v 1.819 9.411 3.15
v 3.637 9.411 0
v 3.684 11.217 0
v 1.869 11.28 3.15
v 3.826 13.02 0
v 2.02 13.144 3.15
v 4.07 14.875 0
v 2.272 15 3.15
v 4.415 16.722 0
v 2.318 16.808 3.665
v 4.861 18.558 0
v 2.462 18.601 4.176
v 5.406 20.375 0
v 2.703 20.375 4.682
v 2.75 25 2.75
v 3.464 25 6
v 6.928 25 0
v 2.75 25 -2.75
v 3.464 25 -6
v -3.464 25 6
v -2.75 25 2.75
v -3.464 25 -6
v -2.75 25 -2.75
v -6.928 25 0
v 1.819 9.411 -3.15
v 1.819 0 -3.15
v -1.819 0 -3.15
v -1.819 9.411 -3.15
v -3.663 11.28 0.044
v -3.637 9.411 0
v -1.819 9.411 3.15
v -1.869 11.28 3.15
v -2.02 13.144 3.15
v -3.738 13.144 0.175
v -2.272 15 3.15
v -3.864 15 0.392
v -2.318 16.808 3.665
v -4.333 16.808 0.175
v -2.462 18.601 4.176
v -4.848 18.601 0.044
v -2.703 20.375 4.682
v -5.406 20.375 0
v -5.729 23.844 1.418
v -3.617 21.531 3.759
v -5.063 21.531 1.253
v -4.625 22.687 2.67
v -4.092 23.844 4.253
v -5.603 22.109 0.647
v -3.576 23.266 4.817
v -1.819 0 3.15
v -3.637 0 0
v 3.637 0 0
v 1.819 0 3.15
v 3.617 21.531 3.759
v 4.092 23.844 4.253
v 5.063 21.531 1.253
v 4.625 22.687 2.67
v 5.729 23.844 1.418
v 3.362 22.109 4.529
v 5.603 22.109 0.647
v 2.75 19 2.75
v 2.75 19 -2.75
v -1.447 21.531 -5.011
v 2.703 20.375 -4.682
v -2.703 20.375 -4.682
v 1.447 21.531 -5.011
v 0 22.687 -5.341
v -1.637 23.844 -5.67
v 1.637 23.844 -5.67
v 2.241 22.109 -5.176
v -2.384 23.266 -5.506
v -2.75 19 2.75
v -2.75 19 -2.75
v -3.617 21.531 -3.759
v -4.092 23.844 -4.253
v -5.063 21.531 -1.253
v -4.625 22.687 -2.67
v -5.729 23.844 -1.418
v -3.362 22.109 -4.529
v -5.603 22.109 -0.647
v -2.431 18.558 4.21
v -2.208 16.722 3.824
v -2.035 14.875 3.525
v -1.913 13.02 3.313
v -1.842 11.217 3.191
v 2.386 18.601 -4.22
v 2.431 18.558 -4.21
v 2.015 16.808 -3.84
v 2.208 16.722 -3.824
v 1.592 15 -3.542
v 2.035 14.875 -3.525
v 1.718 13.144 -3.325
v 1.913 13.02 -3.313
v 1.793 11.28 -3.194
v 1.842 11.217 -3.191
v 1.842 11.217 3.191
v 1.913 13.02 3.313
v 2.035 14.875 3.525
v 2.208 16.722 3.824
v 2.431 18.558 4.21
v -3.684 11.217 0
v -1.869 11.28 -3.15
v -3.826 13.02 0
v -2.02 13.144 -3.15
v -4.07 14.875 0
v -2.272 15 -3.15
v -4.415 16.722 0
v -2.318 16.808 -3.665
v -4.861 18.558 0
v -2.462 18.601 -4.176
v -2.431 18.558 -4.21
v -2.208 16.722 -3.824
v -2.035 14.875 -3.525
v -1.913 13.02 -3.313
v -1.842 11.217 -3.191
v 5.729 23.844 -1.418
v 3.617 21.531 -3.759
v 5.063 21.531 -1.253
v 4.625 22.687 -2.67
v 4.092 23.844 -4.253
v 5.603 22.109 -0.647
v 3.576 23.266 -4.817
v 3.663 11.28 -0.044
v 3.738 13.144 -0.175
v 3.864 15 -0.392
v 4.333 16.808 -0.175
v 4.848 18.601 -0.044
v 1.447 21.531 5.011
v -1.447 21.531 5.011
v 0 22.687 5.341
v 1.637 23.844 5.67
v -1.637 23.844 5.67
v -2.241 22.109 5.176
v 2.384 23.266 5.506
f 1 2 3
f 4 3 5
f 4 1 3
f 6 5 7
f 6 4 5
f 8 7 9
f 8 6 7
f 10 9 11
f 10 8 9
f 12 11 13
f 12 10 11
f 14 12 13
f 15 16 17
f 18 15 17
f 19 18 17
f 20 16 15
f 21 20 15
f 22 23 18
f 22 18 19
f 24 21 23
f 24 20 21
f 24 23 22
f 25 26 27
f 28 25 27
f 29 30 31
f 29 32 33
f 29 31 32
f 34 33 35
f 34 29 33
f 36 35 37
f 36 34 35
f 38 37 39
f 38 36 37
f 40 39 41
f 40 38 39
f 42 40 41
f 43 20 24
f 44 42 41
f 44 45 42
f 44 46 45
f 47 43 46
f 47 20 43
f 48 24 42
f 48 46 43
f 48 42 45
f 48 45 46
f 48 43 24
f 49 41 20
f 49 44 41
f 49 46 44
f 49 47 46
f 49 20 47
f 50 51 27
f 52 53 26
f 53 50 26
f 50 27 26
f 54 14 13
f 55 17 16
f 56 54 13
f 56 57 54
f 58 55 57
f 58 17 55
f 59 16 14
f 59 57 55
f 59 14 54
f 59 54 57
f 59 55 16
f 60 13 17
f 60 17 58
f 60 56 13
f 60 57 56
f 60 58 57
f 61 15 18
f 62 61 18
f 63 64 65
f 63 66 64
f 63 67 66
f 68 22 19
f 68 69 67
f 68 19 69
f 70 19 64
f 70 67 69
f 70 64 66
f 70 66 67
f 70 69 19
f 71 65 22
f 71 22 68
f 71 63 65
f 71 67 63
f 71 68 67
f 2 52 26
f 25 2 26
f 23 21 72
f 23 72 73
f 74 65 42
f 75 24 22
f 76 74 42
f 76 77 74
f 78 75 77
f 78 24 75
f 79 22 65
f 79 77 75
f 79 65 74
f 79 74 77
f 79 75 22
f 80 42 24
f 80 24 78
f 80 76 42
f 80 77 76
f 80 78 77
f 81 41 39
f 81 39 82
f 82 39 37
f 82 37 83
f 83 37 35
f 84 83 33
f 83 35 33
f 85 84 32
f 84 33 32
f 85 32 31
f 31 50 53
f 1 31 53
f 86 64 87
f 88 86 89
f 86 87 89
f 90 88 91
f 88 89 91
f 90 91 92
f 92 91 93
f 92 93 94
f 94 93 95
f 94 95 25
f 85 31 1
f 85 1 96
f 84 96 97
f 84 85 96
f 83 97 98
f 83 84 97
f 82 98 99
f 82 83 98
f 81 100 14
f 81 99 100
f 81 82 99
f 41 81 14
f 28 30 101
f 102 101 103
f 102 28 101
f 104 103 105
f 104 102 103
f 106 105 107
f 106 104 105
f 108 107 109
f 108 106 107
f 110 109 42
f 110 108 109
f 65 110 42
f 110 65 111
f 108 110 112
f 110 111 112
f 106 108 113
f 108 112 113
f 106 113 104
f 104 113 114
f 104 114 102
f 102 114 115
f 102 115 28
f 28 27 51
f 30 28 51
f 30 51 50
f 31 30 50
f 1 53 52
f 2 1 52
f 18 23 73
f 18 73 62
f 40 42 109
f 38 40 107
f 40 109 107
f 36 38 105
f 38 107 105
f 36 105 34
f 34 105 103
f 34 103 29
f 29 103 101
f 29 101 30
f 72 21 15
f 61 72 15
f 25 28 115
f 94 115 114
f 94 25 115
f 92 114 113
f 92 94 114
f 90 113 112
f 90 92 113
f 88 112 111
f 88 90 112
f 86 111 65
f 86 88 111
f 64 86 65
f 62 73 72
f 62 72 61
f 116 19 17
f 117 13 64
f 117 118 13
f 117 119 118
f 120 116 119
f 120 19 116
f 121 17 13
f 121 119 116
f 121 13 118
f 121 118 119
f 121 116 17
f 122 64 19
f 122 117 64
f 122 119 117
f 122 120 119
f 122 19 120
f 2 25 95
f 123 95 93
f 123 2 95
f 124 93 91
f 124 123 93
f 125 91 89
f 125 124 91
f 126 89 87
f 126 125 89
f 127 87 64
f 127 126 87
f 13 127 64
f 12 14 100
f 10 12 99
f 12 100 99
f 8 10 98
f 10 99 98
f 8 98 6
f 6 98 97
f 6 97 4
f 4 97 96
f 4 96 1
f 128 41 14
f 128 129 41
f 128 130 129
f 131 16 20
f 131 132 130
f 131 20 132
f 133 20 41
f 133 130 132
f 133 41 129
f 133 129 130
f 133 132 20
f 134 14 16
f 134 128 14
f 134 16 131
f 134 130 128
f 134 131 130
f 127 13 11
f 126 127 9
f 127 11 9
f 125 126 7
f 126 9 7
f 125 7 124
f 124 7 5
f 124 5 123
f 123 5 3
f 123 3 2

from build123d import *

# Parameters (mm, degrees)
BOSS_EXTRU_1_DEPTH      = 15
ESQUISSE4_W             = 5.5
ESQUISSE4_H             = 5.5
ENL_V_MAT_EXTRU_1_DEPTH = 6
CONG_2_R                = 40


with BuildPart() as part:
    # Esquisse1 → Boss.-Extru.1 (new body)
    with BuildSketch(Plane(origin=(0, 0, 0), x_dir=(1, 0, 0), z_dir=(0, 1, 0))):
        Polygon((1.818653348, -3.15), (3.637306696, 0), (1.818653348, 3.15), (-1.818653348, 3.15), (-3.637306696, 0), (-1.818653348, -3.15), align=None)
    extrude(amount=BOSS_EXTRU_1_DEPTH)

    # Esquisse3 → section 1 of lissage1
    with BuildSketch(Plane(origin=(0, 25, 0), x_dir=(1, 0, 0), z_dir=(0, 1, 0)), mode=Mode.PRIVATE) as lissage1_s1:
        with BuildLine():
            Line((3.464101615, -6), (6.92820323, 0))
            Line((6.92820323, 0), (3.464101615, 6))
            Line((3.464101615, 6), (-3.464101615, 6))
            Line((-3.464101615, 6), (-6.92820323, 0))
            Line((-6.92820323, 0), (-3.464101615, -6))
            Line((-3.464101615, -6), (3.464101615, -6))
        make_face()
    # loft from a face of the part (lissage1)
    loft([part.faces().sort_by_distance((0, 15, 0))[0], lissage1_s1.sketch])

    # Esquisse4 → Enlèv. mat.-Extru.1 (cut)
    with BuildSketch(Plane(origin=(0, 25, 0), x_dir=(1, 0, 0), z_dir=(0, 1, 0))):
        Rectangle(ESQUISSE4_W, ESQUISSE4_H)
    extrude(amount=-ENL_V_MAT_EXTRU_1_DEPTH, mode=Mode.SUBTRACT)

    # Congé2
    # the kernel refuses this fillet: 40 mm, written as the material it adds along each edge
    with BuildSketch(Plane(origin=(-15.790476474, 15, 3.15), x_dir=(0, -1, 0), z_dir=(1, 0, 0))) as cong_2_piece_1_section:
        with BuildLine():
            CenterArc((CONG_2_R * 0.139718231259, -CONG_2_R), CONG_2_R, 90, 15.907551931)
            Line((-CONG_2_R * 0.134367748379, -CONG_2_R * 0.0382948082879), (0, 0))
            Line((0, 0), (CONG_2_R * 0.139718231259, 0))
        make_face()
    cong_2_piece_1 = extrude(amount=31.580952948, mode=Mode.PRIVATE)
    cong_2_piece_1 = cong_2_piece_1 - Plane(origin=(-39.952625281, 9.41127075, 17.100023118), x_dir=(0.8660254037844387, 0, -0.5000000000000001), z_dir=(-0.5000000000000001, 0, -0.8660254037844387)) * Cylinder(40, 86, mode=Mode.PRIVATE)
    cong_2_piece_1 = cong_2_piece_1 - Plane(origin=(32.057387044, 9.41127075, 30.774976882), x_dir=(-0.8660254037844385, 0, -0.5000000000000003), z_dir=(-0.5000000000000003, 0, 0.8660254037844385)) * Cylinder(40, 86, mode=Mode.PRIVATE)
    add(cong_2_piece_1)
    with BuildSketch(Plane(origin=(-5.167258215, 15, 15.249953764), x_dir=(0, -1, 0), z_dir=(0.5000000000000003, 0, -0.8660254037844385))) as cong_2_piece_2_section:
        with BuildLine():
            CenterArc((CONG_2_R * 0.139718231259, -CONG_2_R), CONG_2_R, 90, 15.907551931)
            Line((-CONG_2_R * 0.134367748379, -CONG_2_R * 0.0382948082879), (0, 0))
            Line((0, 0), (CONG_2_R * 0.139718231259, 0))
        make_face()
    cong_2_piece_2 = extrude(amount=31.580952948, mode=Mode.PRIVATE)
    cong_2_piece_2 = cong_2_piece_2 - Plane(origin=(42.680605303, 9.41127075, -12.375023118), x_dir=(-0.8660254037844388, 0, 0.4999999999999999), z_dir=(0.4999999999999999, 0, 0.8660254037844388)) * Cylinder(40, 86, mode=Mode.PRIVATE)
    cong_2_piece_2 = cong_2_piece_2 - Plane(origin=(-5.167258215, 9.41127075, 43.15), x_dir=(0, 0, -1), z_dir=(-1, 0, 0)) * Cylinder(40, 86, mode=Mode.PRIVATE)
    add(cong_2_piece_2)
    with BuildSketch(Plane(origin=(10.623218259, 15, 12.099953764), x_dir=(0, -1, 0), z_dir=(-0.49999999999999994, 0, -0.8660254037844388))) as cong_2_piece_3_section:
        with BuildLine():
            CenterArc((CONG_2_R * 0.139718231259, -CONG_2_R), CONG_2_R, 90, 15.907551931)
            Line((-CONG_2_R * 0.134367748379, -CONG_2_R * 0.0382948082879), (0, 0))
            Line((0, 0), (CONG_2_R * 0.139718231259, 0))
        make_face()
    cong_2_piece_3 = extrude(amount=31.580952948, mode=Mode.PRIVATE)
    cong_2_piece_3 = cong_2_piece_3 - Plane(origin=(34.785367066, 9.41127075, 26.049976882), x_dir=(-0.8660254037844385, 0, -0.5000000000000003), z_dir=(-0.5000000000000003, 0, 0.8660254037844385)) * Cylinder(40, 86, mode=Mode.PRIVATE)
    cong_2_piece_3 = cong_2_piece_3 - Plane(origin=(10.623218259, 9.41127075, -43.15), x_dir=(0, 0, 1), z_dir=(1, 0, 0)) * Cylinder(40, 86, mode=Mode.PRIVATE)
    add(cong_2_piece_3)
    with BuildSketch(Plane(origin=(15.790476474, 15, -3.15), x_dir=(0, -1, 0), z_dir=(-1, 0, 0))) as cong_2_piece_4_section:
        with BuildLine():
            CenterArc((CONG_2_R * 0.139718231259, -CONG_2_R), CONG_2_R, 90, 15.907551931)
            Line((-CONG_2_R * 0.134367748379, -CONG_2_R * 0.0382948082879), (0, 0))
            Line((0, 0), (CONG_2_R * 0.139718231259, 0))
        make_face()
    cong_2_piece_4 = extrude(amount=31.580952948, mode=Mode.PRIVATE)
    cong_2_piece_4 = cong_2_piece_4 - Plane(origin=(-32.057387044, 9.41127075, -30.774976882), x_dir=(0.8660254037844385, 0, 0.5000000000000002), z_dir=(0.5000000000000003, 0, -0.8660254037844386)) * Cylinder(40, 86, mode=Mode.PRIVATE)
    cong_2_piece_4 = cong_2_piece_4 - Plane(origin=(39.952625281, 9.41127075, -17.100023118), x_dir=(-0.8660254037844388, 0, 0.4999999999999999), z_dir=(0.4999999999999999, 0, 0.8660254037844388)) * Cylinder(40, 86, mode=Mode.PRIVATE)
    add(cong_2_piece_4)
    with BuildSketch(Plane(origin=(5.167258215, 15, -15.249953764), x_dir=(0, -1, 0), z_dir=(-0.5000000000000003, 0, 0.8660254037844386))) as cong_2_piece_5_section:
        with BuildLine():
            CenterArc((CONG_2_R * 0.139718231259, -CONG_2_R), CONG_2_R, 90, 15.907551931)
            Line((-CONG_2_R * 0.134367748379, -CONG_2_R * 0.0382948082879), (0, 0))
            Line((0, 0), (CONG_2_R * 0.139718231259, 0))
        make_face()
    cong_2_piece_5 = extrude(amount=31.580952948, mode=Mode.PRIVATE)
    cong_2_piece_5 = cong_2_piece_5 - Plane(origin=(-42.680605303, 9.41127075, 12.375023118), x_dir=(0.8660254037844387, 0, -0.5000000000000001), z_dir=(-0.5000000000000001, 0, -0.8660254037844387)) * Cylinder(40, 86, mode=Mode.PRIVATE)
    cong_2_piece_5 = cong_2_piece_5 - Plane(origin=(5.167258215, 9.41127075, -43.15), x_dir=(0, 0, 1), z_dir=(1, 0, 0)) * Cylinder(40, 86, mode=Mode.PRIVATE)
    add(cong_2_piece_5)
    with BuildSketch(Plane(origin=(-10.623218259, 15, -12.099953764), x_dir=(0, -1, 0), z_dir=(0.5000000000000001, 0, 0.8660254037844387))) as cong_2_piece_6_section:
        with BuildLine():
            CenterArc((CONG_2_R * 0.139718231259, -CONG_2_R), CONG_2_R, 90, 15.907551931)
            Line((-CONG_2_R * 0.134367748379, -CONG_2_R * 0.0382948082879), (0, 0))
            Line((0, 0), (CONG_2_R * 0.139718231259, 0))
        make_face()
    cong_2_piece_6 = extrude(amount=31.580952948, mode=Mode.PRIVATE)
    cong_2_piece_6 = cong_2_piece_6 - Plane(origin=(-34.785367066, 9.41127075, -26.049976882), x_dir=(0.8660254037844385, 0, 0.5000000000000002), z_dir=(0.5000000000000003, 0, -0.8660254037844386)) * Cylinder(40, 86, mode=Mode.PRIVATE)
    cong_2_piece_6 = cong_2_piece_6 - Plane(origin=(-10.623218259, 9.41127075, 43.15), x_dir=(0, 0, -1), z_dir=(-1, 0, 0)) * Cylinder(40, 86, mode=Mode.PRIVATE)
    add(cong_2_piece_6)


solid = part.part
